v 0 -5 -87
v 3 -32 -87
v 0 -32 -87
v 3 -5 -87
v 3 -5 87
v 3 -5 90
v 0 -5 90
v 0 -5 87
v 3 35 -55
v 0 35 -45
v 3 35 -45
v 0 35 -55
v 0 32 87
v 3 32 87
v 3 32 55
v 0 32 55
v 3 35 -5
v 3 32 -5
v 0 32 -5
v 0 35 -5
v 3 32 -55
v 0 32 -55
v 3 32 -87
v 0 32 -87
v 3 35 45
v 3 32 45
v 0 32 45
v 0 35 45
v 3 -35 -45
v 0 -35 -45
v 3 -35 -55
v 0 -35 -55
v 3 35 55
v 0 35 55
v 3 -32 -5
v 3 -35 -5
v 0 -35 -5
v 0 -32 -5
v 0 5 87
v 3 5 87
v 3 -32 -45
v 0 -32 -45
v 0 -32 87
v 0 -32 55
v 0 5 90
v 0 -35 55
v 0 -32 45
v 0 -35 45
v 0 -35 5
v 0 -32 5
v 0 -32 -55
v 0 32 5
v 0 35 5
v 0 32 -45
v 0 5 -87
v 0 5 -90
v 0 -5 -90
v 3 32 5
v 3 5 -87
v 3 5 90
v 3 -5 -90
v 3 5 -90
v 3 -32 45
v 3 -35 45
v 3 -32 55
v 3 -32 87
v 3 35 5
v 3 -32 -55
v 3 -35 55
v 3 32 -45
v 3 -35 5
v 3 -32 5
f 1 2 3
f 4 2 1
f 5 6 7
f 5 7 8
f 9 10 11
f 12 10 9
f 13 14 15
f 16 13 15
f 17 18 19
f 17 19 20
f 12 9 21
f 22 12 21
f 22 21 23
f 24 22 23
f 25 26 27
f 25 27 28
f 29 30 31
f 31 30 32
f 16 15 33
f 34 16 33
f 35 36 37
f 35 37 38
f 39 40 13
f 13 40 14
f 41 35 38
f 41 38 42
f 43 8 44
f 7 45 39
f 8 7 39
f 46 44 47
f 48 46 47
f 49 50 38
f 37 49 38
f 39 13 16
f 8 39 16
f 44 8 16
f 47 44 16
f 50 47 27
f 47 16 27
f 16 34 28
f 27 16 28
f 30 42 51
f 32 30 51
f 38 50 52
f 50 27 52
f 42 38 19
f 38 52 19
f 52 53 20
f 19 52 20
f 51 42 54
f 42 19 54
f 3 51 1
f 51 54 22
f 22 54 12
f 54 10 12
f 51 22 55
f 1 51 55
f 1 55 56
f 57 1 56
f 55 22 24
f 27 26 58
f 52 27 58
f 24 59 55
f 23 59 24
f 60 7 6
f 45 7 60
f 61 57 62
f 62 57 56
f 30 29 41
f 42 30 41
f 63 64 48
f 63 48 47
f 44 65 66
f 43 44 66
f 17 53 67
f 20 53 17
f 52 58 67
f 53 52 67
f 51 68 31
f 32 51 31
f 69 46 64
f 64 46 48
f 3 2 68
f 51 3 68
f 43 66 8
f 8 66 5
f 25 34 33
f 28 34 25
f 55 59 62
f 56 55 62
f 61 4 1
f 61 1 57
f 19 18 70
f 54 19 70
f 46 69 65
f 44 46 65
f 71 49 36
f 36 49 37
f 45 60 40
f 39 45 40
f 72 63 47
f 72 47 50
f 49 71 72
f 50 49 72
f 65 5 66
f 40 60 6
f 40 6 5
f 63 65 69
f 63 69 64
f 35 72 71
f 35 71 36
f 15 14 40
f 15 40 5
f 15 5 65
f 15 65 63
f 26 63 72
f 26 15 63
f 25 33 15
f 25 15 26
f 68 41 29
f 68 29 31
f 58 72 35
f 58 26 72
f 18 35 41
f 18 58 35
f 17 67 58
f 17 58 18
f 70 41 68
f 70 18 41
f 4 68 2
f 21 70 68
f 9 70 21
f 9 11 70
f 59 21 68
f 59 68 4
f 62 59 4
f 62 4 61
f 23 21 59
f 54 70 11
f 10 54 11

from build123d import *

# Parameters (mm, degrees)
SKETCH1_W           = 180
SKETCH1_H           = 70
BOSS_EXTRUDE1_DEPTH = 3
SKETCH2_W           = 3
SKETCH2_H           = 27
SKETCH2_W_2         = 40
SKETCH2_H_2         = 3
CUT_EXTRUDE6_DEPTH  = 10


with BuildPart() as part:
    # Sketch1 → Boss-Extrude1 (new body)
    with BuildSketch(Plane(origin=(0, 0, 0), x_dir=(0, 0, -1), z_dir=(1, 0, 0))):
        Rectangle(SKETCH1_W, SKETCH1_H)
    extrude(amount=BOSS_EXTRUDE1_DEPTH)

    # Sketch2 → Cut-Extrude6 (cut)
    with BuildSketch(Plane(origin=(3, 0, 0), x_dir=(0, 0, -1), z_dir=(1, 0, 0))):
        Polygon((90, -32), (87, -32), (55, -32), (55, -35), (90, -35), align=None)
        with Locations((88.5, -18.5)):
            Rectangle(SKETCH2_W, SKETCH2_H)
        with Locations((25, -33.5)):
            Rectangle(SKETCH2_W_2, SKETCH2_H_2)
        with Locations((-25, -33.5)):
            Rectangle(SKETCH2_W_2, SKETCH2_H_2)
        Polygon((-55, -32), (-87, -32), (-90, -32), (-90, -35), (-55, -35), align=None)
        with Locations((-88.5, -18.5)):
            Rectangle(SKETCH2_W, SKETCH2_H)
        with Locations((-88.5, 18.5)):
            Rectangle(SKETCH2_W, SKETCH2_H)
        Polygon((-87, 32), (-55, 32), (-55, 35), (-90, 35), (-90, 32), align=None)
        with Locations((-25, 33.5)):
            Rectangle(SKETCH2_W_2, SKETCH2_H_2)
        with Locations((25, 33.5)):
            Rectangle(SKETCH2_W_2, SKETCH2_H_2)
        Polygon((55, 32), (87, 32), (90, 32), (90, 35), (55, 35), align=None)
        with Locations((88.5, 18.5)):
            Rectangle(SKETCH2_W, SKETCH2_H)
    extrude(amount=-CUT_EXTRUDE6_DEPTH, mode=Mode.SUBTRACT)


solid = part.part
